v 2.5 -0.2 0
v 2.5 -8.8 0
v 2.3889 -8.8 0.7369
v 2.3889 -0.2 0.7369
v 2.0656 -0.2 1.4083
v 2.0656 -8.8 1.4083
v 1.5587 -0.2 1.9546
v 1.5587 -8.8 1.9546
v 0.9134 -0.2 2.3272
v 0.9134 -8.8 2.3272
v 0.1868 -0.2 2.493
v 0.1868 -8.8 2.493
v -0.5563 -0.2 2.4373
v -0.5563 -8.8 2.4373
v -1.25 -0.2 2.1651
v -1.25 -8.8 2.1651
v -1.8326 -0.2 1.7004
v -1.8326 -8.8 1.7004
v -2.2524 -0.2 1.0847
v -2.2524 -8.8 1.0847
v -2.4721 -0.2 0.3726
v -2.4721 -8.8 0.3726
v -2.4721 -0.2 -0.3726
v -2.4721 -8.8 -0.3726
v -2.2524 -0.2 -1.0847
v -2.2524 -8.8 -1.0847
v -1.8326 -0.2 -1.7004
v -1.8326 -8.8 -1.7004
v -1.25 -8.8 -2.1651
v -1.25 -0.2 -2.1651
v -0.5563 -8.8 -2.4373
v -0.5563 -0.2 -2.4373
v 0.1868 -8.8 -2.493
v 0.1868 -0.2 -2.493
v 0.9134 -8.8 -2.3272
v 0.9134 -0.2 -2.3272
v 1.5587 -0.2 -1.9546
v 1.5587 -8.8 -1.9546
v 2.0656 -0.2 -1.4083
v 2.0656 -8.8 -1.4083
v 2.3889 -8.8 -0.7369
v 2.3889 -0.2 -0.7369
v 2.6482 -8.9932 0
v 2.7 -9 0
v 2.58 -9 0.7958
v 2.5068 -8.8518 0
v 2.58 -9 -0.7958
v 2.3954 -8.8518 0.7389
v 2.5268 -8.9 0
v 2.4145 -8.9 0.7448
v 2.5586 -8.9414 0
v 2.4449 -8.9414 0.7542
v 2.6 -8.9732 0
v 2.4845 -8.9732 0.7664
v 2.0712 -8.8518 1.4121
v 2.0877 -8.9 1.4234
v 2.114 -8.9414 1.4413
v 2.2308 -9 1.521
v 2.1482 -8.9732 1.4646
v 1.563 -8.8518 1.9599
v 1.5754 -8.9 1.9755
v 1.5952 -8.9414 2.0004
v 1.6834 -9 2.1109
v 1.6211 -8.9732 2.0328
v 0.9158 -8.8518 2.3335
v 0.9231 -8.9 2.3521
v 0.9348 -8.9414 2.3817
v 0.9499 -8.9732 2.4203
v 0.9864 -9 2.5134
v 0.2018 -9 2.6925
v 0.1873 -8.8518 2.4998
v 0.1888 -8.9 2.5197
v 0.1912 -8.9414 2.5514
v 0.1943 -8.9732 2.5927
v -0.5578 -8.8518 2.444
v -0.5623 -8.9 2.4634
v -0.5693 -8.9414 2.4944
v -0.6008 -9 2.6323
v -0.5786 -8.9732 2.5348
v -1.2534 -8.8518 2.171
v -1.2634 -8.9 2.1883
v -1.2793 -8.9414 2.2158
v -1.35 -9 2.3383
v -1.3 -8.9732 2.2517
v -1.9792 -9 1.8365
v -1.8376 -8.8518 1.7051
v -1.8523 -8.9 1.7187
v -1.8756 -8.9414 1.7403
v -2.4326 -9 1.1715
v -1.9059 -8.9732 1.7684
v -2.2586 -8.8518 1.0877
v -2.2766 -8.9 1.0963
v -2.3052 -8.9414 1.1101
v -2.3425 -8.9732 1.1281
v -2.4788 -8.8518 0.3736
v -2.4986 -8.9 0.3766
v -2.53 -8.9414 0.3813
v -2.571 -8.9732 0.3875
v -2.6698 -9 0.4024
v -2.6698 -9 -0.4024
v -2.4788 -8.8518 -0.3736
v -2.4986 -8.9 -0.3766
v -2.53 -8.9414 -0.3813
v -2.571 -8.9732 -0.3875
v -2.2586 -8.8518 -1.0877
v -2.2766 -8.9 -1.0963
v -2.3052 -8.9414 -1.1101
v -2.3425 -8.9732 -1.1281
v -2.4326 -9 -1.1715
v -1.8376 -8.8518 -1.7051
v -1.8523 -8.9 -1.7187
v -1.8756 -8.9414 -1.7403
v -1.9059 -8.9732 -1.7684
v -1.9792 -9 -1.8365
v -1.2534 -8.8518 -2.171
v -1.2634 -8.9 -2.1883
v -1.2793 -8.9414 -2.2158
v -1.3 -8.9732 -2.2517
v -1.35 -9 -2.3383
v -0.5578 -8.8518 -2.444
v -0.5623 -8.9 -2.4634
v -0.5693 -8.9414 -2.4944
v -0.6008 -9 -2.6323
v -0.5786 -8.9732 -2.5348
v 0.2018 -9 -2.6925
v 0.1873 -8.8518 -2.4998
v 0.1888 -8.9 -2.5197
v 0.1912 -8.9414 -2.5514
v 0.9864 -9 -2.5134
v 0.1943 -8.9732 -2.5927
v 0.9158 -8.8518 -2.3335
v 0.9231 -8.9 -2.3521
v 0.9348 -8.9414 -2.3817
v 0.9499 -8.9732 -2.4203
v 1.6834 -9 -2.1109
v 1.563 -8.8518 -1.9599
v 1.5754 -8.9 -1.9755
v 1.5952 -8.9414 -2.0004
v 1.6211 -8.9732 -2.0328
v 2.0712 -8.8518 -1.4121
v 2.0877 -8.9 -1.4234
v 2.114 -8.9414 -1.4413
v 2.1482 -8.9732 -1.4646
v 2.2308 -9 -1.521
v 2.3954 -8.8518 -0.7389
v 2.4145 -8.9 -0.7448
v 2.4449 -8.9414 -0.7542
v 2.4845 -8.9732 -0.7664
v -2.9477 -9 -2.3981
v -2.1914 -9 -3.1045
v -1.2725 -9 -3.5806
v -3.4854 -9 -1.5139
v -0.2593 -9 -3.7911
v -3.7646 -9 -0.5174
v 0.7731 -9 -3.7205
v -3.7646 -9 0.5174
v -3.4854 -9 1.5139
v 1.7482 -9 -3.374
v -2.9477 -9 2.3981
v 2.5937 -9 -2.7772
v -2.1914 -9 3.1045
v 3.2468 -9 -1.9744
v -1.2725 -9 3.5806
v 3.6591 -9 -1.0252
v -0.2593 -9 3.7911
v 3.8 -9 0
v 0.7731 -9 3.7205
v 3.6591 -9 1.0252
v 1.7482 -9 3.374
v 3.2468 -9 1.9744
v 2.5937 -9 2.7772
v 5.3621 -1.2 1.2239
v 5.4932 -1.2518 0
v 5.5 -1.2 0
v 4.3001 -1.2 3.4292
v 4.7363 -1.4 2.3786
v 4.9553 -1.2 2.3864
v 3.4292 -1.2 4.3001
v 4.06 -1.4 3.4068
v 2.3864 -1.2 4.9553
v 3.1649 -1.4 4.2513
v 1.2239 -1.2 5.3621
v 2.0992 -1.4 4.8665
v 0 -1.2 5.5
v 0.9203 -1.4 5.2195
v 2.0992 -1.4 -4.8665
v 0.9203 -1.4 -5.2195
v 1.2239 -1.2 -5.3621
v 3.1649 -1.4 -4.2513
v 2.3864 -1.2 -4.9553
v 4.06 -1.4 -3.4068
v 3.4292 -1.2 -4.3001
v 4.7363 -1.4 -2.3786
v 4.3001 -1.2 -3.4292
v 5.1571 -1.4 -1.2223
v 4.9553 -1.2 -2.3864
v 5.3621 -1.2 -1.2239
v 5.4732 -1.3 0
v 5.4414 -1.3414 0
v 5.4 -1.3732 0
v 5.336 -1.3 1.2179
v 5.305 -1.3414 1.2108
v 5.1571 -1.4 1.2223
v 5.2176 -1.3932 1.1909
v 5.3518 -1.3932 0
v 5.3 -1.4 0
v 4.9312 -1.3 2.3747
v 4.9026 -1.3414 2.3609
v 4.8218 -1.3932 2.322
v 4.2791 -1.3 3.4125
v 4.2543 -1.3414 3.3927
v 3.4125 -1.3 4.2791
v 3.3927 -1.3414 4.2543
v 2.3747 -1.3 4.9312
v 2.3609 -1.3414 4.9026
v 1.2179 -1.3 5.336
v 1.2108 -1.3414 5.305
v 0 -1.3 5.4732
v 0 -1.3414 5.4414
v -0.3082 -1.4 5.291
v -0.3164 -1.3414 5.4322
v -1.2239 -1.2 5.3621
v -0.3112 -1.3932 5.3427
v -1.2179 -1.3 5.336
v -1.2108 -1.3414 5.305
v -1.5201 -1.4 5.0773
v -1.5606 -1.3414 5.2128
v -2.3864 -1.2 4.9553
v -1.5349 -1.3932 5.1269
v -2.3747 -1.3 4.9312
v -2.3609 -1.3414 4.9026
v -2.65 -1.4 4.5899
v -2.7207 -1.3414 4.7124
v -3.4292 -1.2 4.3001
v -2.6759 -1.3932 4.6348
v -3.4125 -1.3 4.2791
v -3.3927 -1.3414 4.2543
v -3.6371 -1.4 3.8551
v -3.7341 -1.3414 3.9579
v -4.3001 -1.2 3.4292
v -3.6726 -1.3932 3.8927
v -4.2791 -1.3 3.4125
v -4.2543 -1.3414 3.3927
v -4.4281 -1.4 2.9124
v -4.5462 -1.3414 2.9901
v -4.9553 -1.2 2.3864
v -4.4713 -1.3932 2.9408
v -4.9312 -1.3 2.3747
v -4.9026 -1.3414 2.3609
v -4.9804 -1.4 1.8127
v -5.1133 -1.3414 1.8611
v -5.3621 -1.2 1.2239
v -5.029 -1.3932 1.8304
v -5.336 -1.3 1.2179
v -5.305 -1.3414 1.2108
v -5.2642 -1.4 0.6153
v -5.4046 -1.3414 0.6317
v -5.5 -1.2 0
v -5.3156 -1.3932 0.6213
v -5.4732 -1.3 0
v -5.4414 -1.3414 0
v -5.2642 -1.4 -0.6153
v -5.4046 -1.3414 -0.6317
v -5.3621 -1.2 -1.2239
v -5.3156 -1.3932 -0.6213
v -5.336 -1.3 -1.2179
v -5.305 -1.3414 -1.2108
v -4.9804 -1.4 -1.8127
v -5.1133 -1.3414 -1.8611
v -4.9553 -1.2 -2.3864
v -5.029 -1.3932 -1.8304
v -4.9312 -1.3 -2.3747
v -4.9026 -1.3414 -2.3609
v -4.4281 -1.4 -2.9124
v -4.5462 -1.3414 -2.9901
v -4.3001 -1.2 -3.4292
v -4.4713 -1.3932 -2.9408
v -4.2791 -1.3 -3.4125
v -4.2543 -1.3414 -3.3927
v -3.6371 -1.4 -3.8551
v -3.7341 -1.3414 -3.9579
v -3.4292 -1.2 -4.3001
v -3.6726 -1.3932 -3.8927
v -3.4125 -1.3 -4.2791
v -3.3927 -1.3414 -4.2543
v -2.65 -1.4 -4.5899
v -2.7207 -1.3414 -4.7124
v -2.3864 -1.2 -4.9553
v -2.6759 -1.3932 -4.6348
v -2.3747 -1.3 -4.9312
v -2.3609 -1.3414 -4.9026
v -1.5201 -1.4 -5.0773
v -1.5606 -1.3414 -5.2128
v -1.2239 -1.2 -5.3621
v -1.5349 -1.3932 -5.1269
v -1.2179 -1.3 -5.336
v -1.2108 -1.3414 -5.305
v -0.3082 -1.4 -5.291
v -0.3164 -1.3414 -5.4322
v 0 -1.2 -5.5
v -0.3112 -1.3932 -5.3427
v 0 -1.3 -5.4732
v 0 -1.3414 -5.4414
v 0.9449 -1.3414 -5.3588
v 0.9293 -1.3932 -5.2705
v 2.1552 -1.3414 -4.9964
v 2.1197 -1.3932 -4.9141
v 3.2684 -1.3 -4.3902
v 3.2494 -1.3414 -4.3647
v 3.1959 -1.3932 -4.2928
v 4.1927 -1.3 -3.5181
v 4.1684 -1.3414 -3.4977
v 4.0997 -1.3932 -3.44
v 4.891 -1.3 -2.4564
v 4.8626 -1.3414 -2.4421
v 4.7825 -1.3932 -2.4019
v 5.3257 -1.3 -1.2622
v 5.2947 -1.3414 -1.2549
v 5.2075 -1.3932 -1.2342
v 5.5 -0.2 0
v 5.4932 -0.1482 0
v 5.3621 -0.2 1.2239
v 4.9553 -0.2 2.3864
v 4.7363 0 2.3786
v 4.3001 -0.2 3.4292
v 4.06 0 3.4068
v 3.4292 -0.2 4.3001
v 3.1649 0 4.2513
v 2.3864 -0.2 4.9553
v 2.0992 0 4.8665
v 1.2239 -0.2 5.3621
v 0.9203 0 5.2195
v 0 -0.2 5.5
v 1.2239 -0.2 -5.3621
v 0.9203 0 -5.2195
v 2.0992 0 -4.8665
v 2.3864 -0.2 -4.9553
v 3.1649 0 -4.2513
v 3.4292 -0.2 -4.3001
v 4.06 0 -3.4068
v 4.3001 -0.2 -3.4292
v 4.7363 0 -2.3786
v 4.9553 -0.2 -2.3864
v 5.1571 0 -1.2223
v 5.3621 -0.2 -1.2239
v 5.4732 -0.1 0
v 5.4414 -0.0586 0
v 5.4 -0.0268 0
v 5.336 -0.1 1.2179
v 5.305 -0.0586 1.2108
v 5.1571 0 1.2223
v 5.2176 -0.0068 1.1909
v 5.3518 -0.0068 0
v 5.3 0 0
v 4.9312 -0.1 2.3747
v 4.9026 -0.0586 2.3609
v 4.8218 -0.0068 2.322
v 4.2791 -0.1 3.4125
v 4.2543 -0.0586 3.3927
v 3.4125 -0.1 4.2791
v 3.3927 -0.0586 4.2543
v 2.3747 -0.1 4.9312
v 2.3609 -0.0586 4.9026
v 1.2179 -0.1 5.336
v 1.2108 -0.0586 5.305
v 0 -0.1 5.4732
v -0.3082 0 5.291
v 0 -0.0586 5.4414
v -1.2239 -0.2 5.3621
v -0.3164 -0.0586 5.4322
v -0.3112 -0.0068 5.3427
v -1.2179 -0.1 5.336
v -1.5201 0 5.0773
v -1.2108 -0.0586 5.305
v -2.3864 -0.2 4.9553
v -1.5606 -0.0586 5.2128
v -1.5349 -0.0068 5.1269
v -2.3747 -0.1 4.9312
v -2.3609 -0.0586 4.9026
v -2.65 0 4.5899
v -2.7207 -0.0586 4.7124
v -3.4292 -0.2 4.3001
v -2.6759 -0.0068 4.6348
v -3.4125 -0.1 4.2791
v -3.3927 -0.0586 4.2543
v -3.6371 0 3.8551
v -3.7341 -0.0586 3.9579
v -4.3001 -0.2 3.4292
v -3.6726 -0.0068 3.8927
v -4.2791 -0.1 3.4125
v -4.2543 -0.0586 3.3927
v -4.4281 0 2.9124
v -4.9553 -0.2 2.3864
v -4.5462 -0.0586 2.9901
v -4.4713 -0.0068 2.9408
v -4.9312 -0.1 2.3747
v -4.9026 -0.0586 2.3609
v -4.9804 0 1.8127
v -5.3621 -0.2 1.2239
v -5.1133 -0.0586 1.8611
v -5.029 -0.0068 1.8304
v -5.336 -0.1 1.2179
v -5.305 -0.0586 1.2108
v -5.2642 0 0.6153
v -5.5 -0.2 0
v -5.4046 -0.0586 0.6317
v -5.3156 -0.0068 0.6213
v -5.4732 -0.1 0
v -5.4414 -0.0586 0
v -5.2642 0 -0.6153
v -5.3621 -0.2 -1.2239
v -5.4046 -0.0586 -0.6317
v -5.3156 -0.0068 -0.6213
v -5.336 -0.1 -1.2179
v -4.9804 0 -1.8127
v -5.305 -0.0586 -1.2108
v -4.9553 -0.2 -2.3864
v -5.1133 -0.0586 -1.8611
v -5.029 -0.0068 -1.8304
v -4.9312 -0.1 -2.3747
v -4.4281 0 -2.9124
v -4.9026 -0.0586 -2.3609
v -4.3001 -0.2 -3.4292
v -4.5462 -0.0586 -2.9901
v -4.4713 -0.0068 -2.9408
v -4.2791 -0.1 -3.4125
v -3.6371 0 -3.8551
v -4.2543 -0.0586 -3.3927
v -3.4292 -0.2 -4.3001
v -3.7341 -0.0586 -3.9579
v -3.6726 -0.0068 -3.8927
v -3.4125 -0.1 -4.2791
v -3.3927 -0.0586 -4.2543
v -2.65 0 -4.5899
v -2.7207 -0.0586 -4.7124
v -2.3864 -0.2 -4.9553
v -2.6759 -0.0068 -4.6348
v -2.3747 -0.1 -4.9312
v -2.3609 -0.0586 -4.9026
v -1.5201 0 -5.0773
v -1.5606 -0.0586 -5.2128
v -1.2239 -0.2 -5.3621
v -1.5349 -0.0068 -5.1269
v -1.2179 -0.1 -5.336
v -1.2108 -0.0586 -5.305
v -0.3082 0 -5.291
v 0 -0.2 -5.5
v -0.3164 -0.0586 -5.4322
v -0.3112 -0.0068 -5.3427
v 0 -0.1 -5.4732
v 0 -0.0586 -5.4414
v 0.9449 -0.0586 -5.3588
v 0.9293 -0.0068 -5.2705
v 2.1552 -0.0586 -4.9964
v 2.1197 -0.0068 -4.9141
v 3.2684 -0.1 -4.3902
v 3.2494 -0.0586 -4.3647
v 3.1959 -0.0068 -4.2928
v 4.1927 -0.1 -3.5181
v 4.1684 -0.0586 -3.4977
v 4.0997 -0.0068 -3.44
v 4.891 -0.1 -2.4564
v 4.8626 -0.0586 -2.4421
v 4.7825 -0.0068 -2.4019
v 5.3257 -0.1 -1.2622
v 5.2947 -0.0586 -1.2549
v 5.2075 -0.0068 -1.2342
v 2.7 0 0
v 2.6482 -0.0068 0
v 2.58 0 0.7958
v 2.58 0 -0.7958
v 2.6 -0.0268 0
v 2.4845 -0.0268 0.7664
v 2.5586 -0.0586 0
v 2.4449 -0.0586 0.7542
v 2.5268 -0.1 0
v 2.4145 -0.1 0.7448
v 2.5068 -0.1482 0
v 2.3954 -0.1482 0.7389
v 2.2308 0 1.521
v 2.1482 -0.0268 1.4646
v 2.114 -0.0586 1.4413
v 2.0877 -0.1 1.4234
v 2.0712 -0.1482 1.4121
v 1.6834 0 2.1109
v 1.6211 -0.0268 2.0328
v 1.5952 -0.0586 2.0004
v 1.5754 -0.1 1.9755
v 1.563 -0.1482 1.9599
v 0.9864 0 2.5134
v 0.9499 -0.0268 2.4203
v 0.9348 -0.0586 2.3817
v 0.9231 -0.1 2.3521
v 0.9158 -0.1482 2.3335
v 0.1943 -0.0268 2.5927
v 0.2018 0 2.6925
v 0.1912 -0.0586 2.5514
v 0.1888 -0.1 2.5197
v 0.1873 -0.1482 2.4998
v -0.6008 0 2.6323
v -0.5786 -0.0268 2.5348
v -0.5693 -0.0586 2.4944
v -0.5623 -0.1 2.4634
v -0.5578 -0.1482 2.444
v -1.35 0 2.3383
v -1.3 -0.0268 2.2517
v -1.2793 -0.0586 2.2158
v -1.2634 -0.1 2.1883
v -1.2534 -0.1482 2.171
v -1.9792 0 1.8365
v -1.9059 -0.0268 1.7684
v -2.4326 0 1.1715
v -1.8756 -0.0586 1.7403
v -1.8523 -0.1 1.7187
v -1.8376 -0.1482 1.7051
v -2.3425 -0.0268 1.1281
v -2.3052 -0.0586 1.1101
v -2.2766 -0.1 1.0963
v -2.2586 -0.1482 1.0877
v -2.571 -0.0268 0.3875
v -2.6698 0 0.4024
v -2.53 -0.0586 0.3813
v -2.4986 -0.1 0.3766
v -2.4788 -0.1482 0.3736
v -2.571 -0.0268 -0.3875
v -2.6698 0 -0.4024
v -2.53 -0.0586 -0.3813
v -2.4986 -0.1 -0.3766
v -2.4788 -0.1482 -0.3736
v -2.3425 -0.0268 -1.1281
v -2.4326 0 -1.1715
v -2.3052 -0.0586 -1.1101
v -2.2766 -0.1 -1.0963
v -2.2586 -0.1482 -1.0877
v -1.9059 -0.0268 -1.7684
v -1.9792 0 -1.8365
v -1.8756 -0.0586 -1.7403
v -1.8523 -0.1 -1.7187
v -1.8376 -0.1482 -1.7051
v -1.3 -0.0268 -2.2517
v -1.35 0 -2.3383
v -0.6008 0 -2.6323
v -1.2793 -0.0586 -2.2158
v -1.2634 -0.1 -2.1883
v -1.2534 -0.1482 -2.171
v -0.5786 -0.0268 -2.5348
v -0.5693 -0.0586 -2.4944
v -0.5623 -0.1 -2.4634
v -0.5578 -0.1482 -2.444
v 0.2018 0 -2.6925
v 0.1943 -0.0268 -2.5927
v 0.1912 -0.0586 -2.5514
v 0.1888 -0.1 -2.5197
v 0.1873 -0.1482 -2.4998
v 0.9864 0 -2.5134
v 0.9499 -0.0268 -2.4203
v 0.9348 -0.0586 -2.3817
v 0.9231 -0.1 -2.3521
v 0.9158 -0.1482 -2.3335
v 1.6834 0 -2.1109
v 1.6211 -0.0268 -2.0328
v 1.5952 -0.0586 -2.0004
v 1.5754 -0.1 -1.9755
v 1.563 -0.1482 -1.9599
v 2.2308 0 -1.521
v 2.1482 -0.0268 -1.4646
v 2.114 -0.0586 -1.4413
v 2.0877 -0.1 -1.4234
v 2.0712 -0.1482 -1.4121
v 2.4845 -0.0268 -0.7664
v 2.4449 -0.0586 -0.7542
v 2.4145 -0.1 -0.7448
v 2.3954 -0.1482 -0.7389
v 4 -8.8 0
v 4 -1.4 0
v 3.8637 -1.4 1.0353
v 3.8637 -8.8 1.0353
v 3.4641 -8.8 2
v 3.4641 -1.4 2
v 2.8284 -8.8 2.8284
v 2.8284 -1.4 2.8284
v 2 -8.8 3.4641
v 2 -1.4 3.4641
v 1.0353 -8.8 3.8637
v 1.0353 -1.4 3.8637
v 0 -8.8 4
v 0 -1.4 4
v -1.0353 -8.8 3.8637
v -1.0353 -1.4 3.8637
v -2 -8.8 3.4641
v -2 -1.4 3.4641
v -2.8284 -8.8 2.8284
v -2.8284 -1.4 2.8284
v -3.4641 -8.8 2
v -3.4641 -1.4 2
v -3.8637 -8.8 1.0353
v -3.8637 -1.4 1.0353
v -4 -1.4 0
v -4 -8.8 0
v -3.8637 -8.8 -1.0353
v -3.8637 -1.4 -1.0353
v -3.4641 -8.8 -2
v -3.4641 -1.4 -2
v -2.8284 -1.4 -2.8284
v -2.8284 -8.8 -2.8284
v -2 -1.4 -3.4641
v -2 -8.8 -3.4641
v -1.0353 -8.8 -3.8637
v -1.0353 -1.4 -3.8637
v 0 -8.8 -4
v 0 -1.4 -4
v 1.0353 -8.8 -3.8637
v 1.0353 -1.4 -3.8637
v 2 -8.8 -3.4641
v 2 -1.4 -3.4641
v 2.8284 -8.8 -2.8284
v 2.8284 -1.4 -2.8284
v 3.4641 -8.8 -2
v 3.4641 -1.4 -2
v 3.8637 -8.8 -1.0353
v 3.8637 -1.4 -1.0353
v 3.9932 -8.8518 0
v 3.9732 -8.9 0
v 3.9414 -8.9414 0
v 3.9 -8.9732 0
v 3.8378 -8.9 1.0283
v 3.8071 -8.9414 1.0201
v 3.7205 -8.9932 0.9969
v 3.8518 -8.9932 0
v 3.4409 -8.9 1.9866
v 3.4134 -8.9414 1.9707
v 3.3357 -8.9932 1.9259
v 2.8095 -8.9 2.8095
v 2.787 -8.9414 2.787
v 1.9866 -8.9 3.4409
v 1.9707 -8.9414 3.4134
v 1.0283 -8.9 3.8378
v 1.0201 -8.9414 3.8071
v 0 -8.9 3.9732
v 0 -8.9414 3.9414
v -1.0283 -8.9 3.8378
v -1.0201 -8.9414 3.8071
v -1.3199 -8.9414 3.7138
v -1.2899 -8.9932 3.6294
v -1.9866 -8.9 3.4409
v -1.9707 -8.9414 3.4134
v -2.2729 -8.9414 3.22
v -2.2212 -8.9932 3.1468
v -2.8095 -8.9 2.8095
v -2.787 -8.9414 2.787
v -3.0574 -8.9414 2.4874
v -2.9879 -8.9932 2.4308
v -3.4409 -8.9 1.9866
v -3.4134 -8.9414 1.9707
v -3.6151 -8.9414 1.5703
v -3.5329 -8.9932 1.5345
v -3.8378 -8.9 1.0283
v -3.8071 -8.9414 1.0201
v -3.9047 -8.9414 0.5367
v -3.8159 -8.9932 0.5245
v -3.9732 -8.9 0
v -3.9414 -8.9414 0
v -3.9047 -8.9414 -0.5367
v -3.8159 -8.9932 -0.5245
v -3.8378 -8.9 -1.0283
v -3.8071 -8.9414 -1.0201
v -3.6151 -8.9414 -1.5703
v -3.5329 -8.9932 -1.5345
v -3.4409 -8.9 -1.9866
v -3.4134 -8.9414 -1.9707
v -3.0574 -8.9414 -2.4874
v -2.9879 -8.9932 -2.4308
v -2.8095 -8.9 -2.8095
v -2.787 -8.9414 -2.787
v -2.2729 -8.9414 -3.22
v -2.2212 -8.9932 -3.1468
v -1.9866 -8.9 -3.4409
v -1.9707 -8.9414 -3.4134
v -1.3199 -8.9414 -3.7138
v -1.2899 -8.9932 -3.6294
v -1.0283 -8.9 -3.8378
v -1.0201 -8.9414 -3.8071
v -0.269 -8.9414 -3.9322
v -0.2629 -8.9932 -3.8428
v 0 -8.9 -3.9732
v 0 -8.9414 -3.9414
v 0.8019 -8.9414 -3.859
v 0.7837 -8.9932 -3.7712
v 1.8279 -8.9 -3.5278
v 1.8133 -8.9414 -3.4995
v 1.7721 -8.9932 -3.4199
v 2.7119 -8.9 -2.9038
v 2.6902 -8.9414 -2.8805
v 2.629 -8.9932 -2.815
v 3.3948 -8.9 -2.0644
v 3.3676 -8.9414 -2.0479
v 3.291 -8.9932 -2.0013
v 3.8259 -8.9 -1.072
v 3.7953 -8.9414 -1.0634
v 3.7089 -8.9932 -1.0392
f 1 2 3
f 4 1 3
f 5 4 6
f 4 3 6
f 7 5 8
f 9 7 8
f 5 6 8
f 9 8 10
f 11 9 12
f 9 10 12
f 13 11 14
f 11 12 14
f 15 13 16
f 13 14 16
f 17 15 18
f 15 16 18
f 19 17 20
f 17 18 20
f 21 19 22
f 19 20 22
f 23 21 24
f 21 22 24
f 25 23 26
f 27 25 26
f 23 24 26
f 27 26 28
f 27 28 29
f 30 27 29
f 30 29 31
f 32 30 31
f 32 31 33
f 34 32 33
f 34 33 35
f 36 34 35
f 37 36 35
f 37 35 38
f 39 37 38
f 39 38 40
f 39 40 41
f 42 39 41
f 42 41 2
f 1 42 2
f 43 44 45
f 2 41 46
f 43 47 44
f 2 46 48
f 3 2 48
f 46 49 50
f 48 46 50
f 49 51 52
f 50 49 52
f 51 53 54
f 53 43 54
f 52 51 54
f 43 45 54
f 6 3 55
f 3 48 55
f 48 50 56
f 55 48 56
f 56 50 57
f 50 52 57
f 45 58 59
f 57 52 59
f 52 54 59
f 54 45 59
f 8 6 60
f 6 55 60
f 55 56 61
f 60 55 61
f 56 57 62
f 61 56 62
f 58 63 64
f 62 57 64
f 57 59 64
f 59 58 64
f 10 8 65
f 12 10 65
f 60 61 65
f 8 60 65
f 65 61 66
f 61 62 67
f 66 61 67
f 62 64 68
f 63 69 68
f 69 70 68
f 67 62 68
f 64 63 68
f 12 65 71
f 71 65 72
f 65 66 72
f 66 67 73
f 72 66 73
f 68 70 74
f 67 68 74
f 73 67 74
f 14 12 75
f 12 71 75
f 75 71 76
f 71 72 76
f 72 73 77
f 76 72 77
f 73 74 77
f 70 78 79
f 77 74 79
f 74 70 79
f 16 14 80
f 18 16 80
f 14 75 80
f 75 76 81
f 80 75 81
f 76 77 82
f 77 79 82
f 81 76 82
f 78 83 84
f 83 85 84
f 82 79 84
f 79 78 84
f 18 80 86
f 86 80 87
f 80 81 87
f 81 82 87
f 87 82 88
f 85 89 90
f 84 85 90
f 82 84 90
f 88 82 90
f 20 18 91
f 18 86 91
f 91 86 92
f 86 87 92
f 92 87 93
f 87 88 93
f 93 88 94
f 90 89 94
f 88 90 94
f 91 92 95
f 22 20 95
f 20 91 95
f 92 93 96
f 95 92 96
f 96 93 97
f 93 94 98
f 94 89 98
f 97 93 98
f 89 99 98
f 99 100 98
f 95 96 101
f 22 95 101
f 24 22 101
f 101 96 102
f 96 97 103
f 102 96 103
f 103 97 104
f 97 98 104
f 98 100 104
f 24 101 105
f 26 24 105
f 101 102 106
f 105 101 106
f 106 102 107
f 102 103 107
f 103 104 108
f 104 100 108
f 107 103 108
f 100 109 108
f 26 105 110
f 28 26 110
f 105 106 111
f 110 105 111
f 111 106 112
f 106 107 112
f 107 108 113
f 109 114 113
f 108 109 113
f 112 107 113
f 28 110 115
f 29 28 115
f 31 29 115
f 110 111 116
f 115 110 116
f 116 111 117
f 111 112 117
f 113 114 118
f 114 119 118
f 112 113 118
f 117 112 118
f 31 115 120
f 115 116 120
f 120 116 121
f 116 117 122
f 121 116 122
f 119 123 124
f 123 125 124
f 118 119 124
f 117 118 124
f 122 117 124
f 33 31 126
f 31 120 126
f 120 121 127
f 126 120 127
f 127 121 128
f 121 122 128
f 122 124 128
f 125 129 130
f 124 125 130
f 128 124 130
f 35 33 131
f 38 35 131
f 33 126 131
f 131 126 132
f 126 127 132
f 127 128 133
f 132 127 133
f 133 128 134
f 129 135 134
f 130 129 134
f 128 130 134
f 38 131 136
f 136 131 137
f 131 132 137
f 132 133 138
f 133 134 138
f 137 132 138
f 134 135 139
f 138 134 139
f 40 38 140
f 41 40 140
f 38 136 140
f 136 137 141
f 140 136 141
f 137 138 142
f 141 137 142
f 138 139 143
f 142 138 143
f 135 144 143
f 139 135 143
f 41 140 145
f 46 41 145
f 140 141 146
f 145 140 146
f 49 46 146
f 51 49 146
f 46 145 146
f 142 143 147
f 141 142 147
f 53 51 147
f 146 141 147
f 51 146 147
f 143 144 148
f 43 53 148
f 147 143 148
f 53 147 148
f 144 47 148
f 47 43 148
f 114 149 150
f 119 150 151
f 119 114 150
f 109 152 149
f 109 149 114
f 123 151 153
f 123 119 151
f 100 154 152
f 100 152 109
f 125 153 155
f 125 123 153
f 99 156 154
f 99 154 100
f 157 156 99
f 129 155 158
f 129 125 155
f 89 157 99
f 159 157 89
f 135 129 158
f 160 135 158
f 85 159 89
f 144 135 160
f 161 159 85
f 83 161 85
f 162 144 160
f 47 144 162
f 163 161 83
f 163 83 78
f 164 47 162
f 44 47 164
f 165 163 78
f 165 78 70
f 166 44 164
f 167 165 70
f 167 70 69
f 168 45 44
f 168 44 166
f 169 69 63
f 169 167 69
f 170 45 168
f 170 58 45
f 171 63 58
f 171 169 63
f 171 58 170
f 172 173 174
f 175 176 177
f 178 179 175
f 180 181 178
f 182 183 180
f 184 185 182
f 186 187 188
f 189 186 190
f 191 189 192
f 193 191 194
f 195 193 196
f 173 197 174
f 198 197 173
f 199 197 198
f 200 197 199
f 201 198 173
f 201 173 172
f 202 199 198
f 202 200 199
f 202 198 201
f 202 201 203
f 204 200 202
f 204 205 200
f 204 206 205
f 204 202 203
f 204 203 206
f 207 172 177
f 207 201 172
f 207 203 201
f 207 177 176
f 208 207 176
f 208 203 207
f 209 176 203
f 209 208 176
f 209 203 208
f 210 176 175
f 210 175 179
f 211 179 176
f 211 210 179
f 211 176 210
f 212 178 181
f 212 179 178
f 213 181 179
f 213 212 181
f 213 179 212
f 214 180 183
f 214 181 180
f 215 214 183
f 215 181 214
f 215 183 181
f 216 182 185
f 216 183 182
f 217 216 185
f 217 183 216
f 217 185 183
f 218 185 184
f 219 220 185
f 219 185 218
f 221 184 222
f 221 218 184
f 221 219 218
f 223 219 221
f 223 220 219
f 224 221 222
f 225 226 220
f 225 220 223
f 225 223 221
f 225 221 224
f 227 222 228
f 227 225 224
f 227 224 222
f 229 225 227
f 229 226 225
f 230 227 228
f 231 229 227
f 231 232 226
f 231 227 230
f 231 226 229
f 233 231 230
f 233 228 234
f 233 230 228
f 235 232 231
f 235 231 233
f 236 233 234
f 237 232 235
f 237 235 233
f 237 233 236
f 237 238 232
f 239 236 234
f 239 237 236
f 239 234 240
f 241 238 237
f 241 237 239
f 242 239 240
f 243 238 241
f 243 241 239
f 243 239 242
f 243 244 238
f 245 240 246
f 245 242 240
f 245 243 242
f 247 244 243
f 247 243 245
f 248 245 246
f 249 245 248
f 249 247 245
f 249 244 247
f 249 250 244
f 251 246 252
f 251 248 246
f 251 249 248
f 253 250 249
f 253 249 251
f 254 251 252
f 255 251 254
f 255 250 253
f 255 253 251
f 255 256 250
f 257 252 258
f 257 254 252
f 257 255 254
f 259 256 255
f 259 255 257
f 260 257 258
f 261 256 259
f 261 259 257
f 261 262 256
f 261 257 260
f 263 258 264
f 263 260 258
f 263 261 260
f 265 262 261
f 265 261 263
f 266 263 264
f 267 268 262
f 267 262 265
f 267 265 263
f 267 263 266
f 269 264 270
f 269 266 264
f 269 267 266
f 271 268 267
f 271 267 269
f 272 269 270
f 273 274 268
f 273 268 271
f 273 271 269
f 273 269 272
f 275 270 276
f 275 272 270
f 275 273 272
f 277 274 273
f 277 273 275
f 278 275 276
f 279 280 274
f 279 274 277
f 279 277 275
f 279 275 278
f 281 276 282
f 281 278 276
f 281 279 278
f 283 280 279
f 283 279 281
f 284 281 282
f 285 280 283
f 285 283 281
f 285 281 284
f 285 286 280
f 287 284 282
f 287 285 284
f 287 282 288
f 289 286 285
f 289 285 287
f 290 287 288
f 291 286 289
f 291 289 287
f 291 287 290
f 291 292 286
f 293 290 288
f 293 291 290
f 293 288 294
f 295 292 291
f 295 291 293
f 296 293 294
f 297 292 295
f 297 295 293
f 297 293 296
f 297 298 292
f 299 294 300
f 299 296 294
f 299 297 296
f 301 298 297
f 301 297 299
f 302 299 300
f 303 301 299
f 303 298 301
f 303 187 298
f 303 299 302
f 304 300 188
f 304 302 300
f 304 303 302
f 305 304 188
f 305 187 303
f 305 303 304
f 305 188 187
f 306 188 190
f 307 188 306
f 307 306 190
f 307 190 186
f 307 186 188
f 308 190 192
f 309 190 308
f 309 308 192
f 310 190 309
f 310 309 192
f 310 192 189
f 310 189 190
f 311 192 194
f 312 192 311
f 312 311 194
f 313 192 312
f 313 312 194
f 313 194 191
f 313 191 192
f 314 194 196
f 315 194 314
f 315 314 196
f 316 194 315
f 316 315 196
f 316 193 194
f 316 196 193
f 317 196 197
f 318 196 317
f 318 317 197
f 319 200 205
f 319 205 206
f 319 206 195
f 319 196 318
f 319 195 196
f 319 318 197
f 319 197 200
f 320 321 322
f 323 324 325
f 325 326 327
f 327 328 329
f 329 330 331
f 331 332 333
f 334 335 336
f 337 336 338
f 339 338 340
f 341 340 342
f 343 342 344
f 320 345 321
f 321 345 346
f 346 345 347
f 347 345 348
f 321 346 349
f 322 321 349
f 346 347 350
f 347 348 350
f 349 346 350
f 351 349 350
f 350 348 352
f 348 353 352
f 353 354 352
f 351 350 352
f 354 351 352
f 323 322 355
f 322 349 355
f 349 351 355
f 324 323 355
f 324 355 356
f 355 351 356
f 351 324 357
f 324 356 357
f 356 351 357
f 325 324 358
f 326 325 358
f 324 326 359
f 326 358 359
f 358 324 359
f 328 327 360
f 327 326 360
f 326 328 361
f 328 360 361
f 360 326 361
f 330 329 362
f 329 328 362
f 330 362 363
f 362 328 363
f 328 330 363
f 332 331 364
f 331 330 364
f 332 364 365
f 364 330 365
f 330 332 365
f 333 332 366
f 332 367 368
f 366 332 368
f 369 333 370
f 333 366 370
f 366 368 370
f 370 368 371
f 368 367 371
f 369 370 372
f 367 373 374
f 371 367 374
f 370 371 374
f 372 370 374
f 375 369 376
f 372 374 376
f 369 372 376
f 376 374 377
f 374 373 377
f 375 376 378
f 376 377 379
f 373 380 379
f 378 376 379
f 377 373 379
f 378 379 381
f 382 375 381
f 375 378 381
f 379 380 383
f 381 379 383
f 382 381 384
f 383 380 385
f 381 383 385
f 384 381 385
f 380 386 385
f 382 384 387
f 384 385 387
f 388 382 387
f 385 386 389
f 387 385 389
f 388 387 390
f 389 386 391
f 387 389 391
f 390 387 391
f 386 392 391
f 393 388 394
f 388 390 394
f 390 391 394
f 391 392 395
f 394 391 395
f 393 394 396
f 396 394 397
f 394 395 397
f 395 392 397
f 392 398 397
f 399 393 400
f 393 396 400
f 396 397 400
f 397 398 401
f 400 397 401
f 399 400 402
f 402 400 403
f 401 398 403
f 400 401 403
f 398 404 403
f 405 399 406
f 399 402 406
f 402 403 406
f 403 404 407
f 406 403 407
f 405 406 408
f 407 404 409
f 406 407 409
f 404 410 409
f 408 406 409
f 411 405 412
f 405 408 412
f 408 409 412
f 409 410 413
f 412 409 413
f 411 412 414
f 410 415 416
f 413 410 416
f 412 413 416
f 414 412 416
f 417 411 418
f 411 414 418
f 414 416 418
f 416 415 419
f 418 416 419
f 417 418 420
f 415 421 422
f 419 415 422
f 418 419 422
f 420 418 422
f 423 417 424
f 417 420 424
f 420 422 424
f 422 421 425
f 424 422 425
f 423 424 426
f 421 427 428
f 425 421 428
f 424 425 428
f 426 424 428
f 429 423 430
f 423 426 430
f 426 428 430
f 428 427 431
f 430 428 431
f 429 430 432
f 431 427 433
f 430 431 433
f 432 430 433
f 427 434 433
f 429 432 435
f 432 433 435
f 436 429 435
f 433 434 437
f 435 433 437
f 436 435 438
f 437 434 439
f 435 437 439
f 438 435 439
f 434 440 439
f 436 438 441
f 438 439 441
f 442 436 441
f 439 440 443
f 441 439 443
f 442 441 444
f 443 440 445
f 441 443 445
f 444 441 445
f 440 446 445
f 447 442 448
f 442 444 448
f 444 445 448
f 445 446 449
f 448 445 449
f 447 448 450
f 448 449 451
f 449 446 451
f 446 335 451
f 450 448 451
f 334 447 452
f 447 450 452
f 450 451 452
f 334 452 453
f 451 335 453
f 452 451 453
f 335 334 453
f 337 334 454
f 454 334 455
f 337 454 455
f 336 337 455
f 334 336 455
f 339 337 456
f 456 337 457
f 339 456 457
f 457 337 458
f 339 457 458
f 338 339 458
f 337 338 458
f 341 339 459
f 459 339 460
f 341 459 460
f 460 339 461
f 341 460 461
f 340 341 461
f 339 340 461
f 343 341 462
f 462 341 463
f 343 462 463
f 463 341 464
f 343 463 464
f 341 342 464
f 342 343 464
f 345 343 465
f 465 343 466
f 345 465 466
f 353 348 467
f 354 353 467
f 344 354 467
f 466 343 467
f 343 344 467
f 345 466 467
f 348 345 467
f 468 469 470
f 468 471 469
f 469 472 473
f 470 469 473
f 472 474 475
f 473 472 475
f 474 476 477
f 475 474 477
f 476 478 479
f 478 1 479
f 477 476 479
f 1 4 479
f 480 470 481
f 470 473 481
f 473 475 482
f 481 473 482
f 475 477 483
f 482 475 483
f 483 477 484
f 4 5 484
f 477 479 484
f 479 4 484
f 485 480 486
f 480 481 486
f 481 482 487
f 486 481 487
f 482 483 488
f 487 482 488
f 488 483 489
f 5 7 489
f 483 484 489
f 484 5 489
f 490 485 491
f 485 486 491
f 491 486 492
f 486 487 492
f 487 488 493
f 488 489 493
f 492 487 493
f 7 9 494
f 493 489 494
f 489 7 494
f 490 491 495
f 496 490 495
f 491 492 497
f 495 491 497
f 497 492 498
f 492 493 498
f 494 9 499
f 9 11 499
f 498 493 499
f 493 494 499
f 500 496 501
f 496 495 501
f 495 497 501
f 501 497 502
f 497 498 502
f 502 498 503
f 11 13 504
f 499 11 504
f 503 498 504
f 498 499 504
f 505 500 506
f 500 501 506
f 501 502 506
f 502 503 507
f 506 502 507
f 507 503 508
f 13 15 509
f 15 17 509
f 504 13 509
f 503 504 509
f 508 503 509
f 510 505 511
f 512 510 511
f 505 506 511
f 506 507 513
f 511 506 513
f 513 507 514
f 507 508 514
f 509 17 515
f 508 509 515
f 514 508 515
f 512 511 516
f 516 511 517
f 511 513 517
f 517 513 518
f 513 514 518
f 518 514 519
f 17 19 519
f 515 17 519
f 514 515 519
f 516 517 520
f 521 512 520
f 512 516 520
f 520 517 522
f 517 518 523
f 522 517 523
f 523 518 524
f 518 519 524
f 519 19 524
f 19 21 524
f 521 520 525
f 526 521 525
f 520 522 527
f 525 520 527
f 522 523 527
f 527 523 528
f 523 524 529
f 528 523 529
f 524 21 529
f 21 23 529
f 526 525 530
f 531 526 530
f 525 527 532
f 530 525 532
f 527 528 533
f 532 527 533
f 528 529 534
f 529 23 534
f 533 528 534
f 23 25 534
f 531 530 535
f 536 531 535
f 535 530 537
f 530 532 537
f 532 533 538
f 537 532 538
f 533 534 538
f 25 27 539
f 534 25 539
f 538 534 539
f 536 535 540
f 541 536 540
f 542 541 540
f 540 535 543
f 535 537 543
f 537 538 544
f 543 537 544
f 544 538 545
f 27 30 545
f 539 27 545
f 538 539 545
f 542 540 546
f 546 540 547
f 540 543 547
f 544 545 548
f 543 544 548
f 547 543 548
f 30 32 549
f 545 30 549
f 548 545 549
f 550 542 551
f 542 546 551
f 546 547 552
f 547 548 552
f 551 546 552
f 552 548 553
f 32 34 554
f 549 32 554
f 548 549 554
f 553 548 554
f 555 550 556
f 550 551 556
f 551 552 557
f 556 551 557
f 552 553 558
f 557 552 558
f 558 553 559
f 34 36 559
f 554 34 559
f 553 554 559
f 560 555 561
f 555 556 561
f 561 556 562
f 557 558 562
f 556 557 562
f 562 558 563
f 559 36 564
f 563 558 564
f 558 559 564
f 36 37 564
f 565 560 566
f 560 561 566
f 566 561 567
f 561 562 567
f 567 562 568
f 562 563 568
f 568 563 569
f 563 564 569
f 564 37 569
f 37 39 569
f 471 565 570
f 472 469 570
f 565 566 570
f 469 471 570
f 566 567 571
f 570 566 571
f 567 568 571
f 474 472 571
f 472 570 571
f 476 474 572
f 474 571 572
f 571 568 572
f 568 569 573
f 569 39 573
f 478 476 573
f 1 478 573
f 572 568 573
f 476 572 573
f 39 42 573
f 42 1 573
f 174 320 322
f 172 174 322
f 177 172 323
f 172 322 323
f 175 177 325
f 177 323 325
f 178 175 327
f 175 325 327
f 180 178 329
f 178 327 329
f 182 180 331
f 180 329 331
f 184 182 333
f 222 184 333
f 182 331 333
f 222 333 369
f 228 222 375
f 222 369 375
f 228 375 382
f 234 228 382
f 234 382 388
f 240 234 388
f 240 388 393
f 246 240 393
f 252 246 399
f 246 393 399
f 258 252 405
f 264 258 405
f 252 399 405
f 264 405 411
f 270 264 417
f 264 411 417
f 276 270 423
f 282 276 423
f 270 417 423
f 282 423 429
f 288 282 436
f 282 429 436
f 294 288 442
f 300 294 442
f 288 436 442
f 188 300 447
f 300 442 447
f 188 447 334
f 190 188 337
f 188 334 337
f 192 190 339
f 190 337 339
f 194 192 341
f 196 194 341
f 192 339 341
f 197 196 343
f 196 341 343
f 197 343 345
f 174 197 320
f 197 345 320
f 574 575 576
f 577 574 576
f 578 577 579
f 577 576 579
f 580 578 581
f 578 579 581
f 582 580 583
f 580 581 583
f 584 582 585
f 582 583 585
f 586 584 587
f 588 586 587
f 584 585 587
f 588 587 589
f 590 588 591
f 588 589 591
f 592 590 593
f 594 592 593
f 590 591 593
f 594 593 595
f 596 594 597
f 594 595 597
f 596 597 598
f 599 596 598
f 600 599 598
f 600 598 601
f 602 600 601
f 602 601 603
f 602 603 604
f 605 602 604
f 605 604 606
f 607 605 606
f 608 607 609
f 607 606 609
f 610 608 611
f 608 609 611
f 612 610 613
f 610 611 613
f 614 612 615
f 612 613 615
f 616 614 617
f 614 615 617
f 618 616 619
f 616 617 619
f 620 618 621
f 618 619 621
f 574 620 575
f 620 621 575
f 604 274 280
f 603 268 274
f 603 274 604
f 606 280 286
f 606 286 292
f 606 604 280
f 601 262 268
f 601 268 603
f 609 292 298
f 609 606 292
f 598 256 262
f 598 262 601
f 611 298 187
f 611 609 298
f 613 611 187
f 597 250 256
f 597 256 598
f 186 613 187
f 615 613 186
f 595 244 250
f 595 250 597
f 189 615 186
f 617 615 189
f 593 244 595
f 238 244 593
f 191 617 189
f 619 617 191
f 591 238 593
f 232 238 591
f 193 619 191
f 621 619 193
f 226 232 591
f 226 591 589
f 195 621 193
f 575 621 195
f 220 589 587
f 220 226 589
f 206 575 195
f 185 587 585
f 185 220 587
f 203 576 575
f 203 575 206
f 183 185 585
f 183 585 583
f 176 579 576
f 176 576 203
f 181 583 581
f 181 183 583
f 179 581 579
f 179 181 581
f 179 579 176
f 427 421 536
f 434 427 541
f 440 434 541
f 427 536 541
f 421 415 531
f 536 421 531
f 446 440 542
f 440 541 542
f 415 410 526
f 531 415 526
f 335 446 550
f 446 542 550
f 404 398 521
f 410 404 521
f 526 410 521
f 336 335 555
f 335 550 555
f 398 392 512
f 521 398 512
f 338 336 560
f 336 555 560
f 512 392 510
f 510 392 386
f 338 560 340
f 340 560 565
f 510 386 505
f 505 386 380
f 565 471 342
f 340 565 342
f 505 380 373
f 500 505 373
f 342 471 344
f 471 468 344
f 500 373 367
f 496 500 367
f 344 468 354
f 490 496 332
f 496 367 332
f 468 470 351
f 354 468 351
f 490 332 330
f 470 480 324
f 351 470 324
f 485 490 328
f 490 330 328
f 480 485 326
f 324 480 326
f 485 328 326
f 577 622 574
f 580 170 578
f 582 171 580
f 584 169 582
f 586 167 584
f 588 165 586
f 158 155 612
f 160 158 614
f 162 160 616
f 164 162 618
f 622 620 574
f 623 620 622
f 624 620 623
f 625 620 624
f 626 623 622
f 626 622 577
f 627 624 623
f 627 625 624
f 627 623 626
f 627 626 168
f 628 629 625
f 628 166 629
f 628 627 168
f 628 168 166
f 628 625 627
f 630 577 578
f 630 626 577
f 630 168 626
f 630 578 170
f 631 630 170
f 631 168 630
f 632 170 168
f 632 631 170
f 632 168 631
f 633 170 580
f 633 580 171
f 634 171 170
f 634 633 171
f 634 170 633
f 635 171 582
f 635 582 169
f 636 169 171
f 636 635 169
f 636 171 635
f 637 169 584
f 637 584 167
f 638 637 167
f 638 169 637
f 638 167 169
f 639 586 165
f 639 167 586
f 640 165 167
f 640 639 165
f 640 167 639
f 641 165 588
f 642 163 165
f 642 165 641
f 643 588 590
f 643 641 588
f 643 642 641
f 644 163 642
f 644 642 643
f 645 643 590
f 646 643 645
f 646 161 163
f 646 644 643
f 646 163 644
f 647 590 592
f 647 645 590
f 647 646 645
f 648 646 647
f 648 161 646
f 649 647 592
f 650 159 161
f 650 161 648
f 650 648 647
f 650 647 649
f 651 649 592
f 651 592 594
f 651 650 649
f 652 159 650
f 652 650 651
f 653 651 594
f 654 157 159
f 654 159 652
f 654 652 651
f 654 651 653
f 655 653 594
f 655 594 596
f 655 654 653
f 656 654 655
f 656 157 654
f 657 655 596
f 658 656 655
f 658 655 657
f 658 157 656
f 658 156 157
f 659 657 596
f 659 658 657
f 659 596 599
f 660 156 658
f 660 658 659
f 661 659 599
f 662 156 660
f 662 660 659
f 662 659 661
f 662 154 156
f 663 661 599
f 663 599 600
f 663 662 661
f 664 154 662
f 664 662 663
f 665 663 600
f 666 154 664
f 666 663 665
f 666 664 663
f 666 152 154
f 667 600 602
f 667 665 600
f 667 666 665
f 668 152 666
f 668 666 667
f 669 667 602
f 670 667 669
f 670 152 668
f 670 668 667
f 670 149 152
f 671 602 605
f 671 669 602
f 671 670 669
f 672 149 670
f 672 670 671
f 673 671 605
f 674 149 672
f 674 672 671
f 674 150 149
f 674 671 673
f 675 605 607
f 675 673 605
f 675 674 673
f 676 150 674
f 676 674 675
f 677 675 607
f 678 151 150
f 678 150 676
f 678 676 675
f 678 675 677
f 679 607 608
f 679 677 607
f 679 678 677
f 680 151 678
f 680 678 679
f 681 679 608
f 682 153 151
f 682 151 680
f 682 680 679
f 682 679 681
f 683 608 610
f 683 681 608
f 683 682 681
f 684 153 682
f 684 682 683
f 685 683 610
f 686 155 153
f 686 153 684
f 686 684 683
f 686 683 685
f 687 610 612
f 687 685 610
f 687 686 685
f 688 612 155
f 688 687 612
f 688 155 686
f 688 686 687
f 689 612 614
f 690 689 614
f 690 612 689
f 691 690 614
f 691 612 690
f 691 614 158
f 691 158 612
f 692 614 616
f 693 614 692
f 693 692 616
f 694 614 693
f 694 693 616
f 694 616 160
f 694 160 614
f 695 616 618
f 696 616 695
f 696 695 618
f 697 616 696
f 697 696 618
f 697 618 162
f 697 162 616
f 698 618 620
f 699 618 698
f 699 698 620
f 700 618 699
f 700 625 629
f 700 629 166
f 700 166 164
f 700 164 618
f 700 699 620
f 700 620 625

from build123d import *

# Parameters (mm, degrees)
F0_R     = 5.5
F1_DEPTH = 1.4
F2_R     = 4
F3_DEPTH = 7.6
F4_R     = 2.5
F5_DEPTH = 10
F6_R     = 0.2


with BuildPart() as f1:
    # F0 (on Front) → F1 (new body)
    with BuildSketch(Plane.XZ):
        Circle(F0_R)
    extrude(amount=F1_DEPTH)

    # F2 (on face) → F3 (join)
    with BuildSketch(Plane.XZ.offset(1.4)):
        Circle(F2_R)
    extrude(amount=F3_DEPTH)

    # F4 (on face) → F5 (cut)
    with BuildSketch(Plane.XZ.offset(9)):
        Circle(F4_R)
    extrude(amount=-F5_DEPTH, mode=Mode.SUBTRACT)

    # F6
    f6_edges = [f1.edges().sort_by_distance(p)[0] for p in [
        (-2.5, -9, 0),
        (-4, -9, 0),
        (-5.5, -1.4, 0),
        (-5.5, 0, 0),
        (-2.5, 0, 0),
    ]]
    fillet(f6_edges, radius=F6_R)


solid = f1.part
